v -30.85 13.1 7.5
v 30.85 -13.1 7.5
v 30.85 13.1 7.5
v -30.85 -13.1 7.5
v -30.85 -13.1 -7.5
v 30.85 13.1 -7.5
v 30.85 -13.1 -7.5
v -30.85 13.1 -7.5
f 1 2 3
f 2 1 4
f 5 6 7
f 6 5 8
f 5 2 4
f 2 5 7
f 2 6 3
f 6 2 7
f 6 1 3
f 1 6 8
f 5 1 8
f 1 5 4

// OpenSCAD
// file: ../settings.scad
// Common settings used by all scad files.

// ALL UNITS IN MILLIMETERS (MM)!!!

$fn = 30;//low-res but fast to render
//$fn = 50;//higher-res but slow to render

pi = 3.1415926535897932384626433832795;

max_footprint = 150; // 15x15 cm

bottom_clearance = 10;
bottom_clearance = 25.4/2+10;
//bottom_clearance = 30;

shell_alpha = 0.215;
//shell_alpha = 1.0;

tolerance = 0.5;

// Flat countersunk M2.5mm x 0.45mm machine screw.
screw_thread_diameter = 2.5;//2.8;//2.75;//2.4?
screw_thread_length = 5;//?
screw_head_diameter = 4.75; // M2.5
//screw_head_diameter = 5.2; // M3
screw_head_height = 1.5;//2;

screw_thread_diameter2 = 2;

unit_thickness = 5;
u = unit_thickness;

shell_thickness = unit_thickness;

// Show flags.
show_platform = 0;
show_head = 1;
show_head_shell = 0;
show_head_electronics_bb = 0;
show_battery = 1;
show_foot_cube = 0;
show_torso = 0;
show_motor = 0;
show_motor_plates = 1;
show_motor_inner_plates = 1;
show_motor_outer_plates = 1;
show_wheel = 0;//obsolete
show_tracks = 1;//
show_track_wheels = 1;
show_caster = 0;
show_rpi = 1;
show_vertical_plates = 1;//
show_horizontal_plates = 1;//
show_caster_plates = 0;//obsolete?
show_camera = 1;
show_screen = 0;
show_edge_mount = 1;
show_sonar_mount = 1;
show_recharge_mount = 1;
show_conduit = 1;
show_torso_shell = 1;
show_recharge_dock = 0;
show_head_tilt_axis = 0;
show_rpi_camera_axis = 0;
show_laser_axis = 0;

head_vertical_angle_tilt = 0;
//head_vertical_angle_tilt = 30;//max
//head_vertical_angle_tilt = 10;

torso_height = 120+20;

base_plate_diameter = max_footprint-unit_thickness*2;
base_plate_frame = 0;

head_height = 50;
head_offset_z = max_footprint/2;
head_middle_cutout = 85;

rpi_with_four_hats_and_clearance = 76;

qrd1114_w = 6.10;
qrd1114_l = 4.39;
qrd1114_h = 4.65;

dock_radius = 10;
dock_gripper_border = 2;
dock_gripper_instep = 0.9;
dock_gripper_cutout_tapper = 50;
dock_receiver_height = 5;

// Patriod Fuel+ 9000 mAh
battery_length = 90;
battery_width = 57;
battery_height = 23;
battery_offset_z = 30;//4;

wheel_diameter = 50;
wheel_offset_x = 65;
wheel_offset_z = wheel_diameter/2;
wheel_axle_diameter = 5;

//caster_diameter = 19.05; // 0.75 inches
caster_diameter = 25.45; // 1 inches
//caster_diameter = 15.875; // 5/8 inches
caster_holder_diameter = 30;//31;
caster_offset_y = base_plate_diameter/2 - caster_holder_diameter/2;

arduino_offset_x = 0;
arduino_offset_y = 0;
arduino_offset_z = 67;
arduino_offset_x2 = 0;
arduino_offset_y2 = -20;
arduino_offset_z2 = torso_height+bottom_clearance;

horizontal_plate_width = unit_thickness*8*2 - unit_thickness*2;
horizontal_plate_depth = unit_thickness*8*2;

vertical_plate_width = horizontal_plate_depth;
vertical_plate_height = unit_thickness*8;
vertical_plate_offset_x = wheel_offset_x-22.5;
vertical_plate_offset_z = vertical_plate_height/2 + unit_thickness/2;

vertical_battery_plate_height = 100 - 15;

caster_plate_width = horizontal_plate_width + unit_thickness*2;
caster_plate_mount_length = unit_thickness*4;
caster_plate_width_minor = caster_holder_diameter;

motor_switch_length = 20;
motor_switch_thickness = 6.5;
motor_switch_height = 11;
motor_switch_height_leads = 23;
motor_switch_on_height =  13.3;
motor_switch_hole_diameter = 2.5;
motor_switch_hole_offset_z = 6.5;//this plus diameter/2 is hole center from switch top
motor_switch_hole_spacing = 7.1;// holes are diameter/2 from this

motor_length = 60;
motor_width = 25;
motor_collar_width = 7;
motor_collar_height = 2.5;
motor_axle_width = 4;
motor_axle_height = 9.5;
motor_offset_x = 10;
//motor_offset_y = motor_width/2+5;
motor_offset_y = unit_thickness*3.5;
motor_offset_z = vertical_plate_height/2 - unit_thickness/2;//4;//30;
motor_mount_holes_dist = 17;
// motor countersink hole
motor_mount_holes_width = 3; // M3
motor_mount_holes_head_height = 2.2;
motor_mount_holes_head_width = 5.8;
motor_bearing_outer_diameter = 10;
motor_bearing_inner_diameter = 5.95;
motor_bearing_thickness = 2.5;

motor_unimount_idler_axle_d = screw_thread_diameter;
//motor_unimount_spacer_depth = 0.1;//too small
motor_unimount_spacer_depth = 0.5;

motor_arm_offset_y = -u*3;
motor_arm_offset_z = u*.5;

motor_plate_width = vertical_plate_width;
motor_plate_height = vertical_plate_height;
motor_plate_thickness = unit_thickness;
motor_plate_offset_z = vertical_plate_offset_z;

motor_plate_middle_thickness = 5;

wheel_hub_offset = u*3;

motor_hole_height_offset = -5;

nylon_spacer_outer_diameter = 6.35;
nylon_spacer_inner_diameter = 3.302;
nylon_spacer_length = 12.7;

track_width = unit_thickness*3;
track_offset_x = -50;
track_offset_z = .1;
//track_wheel_radius = 19;//original
track_wheel_radius = 14;
//track_wheel_hole_radius = (nylon_spacer_outer_diameter+1)/2;
track_wheel_hole_radius = motor_bearing_outer_diameter/2;

track_driver_hole_radius = (motor_axle_width)/2 + 0.1;
track_driver_set_screw_head_d = 4.1;
track_driver_set_screw_shaft_d = 2.4;
//track_wheel_width = 13.5;//original
track_wheel_width = u*2;
track_wheel_width_buffer = u*0.25;
track_offset = 3;        //distance from chassis
track_wheel_offset = track_offset;
//track_length = 250; // see tread_triangle.py, too big
//track_length = 240; // see tread_triangle.py
//track_length = 238; //inc/dec in 10 unit increments so notches match idlers
track_length = 228; //inc/dec in 10 unit increments so notches match idlers
track_radius = track_length/2/pi;
track_wheel_show_fancy = 1;
track_wheel_gap = track_wheel_width + track_wheel_width_buffer*2;
track_axle_bearing_diameter = motor_bearing_inner_diameter - 0.1;
track_tensioner_radius = 12;
track_nut_height = 3.5; //TODO
track_punchout_thickness = 0.25;//should be the same as the minimum layer thickness

head_slew_bearing_outer_diameter = 115;
head_slew_bearing_ring_thickness = 20;
head_slew_bearing_inner_diameter = head_slew_bearing_outer_diameter - head_slew_bearing_ring_thickness;
//head_slew_bearing_hole_diameter = head_slew_bearing_inner_diameter - head_slew_bearing_ring_thickness;
head_slew_bearing_hole_diameter = 12+tolerance; // slip ring https://www.adafruit.com/products/775
//head_slew_bearing_ball_diameter = 5;
head_slew_bearing_ball_diameter = 2.5; //u/2;
head_slew_bearing_height = u;//head_slew_bearing_ball_diameter*2;
head_slew_bearing_gap = 0.5;
head_slew_bearing_slew_gap = 0;
head_slew_bearing_gap_factor = 0.1;

neck_strut_width = u*7;
neck_strut_height = u*18;
neck_strut_spacing = u*8;

show_outer_race = 0;
show_inner_race_a = 1;
show_inner_race_b = 1;
show_balls = 0;
// main file
include <../settings.scad>;

module make_5a_step_down_converter(){
    cube([61.7,26.2,15], center=true);
}

make_5a_step_down_converter();
